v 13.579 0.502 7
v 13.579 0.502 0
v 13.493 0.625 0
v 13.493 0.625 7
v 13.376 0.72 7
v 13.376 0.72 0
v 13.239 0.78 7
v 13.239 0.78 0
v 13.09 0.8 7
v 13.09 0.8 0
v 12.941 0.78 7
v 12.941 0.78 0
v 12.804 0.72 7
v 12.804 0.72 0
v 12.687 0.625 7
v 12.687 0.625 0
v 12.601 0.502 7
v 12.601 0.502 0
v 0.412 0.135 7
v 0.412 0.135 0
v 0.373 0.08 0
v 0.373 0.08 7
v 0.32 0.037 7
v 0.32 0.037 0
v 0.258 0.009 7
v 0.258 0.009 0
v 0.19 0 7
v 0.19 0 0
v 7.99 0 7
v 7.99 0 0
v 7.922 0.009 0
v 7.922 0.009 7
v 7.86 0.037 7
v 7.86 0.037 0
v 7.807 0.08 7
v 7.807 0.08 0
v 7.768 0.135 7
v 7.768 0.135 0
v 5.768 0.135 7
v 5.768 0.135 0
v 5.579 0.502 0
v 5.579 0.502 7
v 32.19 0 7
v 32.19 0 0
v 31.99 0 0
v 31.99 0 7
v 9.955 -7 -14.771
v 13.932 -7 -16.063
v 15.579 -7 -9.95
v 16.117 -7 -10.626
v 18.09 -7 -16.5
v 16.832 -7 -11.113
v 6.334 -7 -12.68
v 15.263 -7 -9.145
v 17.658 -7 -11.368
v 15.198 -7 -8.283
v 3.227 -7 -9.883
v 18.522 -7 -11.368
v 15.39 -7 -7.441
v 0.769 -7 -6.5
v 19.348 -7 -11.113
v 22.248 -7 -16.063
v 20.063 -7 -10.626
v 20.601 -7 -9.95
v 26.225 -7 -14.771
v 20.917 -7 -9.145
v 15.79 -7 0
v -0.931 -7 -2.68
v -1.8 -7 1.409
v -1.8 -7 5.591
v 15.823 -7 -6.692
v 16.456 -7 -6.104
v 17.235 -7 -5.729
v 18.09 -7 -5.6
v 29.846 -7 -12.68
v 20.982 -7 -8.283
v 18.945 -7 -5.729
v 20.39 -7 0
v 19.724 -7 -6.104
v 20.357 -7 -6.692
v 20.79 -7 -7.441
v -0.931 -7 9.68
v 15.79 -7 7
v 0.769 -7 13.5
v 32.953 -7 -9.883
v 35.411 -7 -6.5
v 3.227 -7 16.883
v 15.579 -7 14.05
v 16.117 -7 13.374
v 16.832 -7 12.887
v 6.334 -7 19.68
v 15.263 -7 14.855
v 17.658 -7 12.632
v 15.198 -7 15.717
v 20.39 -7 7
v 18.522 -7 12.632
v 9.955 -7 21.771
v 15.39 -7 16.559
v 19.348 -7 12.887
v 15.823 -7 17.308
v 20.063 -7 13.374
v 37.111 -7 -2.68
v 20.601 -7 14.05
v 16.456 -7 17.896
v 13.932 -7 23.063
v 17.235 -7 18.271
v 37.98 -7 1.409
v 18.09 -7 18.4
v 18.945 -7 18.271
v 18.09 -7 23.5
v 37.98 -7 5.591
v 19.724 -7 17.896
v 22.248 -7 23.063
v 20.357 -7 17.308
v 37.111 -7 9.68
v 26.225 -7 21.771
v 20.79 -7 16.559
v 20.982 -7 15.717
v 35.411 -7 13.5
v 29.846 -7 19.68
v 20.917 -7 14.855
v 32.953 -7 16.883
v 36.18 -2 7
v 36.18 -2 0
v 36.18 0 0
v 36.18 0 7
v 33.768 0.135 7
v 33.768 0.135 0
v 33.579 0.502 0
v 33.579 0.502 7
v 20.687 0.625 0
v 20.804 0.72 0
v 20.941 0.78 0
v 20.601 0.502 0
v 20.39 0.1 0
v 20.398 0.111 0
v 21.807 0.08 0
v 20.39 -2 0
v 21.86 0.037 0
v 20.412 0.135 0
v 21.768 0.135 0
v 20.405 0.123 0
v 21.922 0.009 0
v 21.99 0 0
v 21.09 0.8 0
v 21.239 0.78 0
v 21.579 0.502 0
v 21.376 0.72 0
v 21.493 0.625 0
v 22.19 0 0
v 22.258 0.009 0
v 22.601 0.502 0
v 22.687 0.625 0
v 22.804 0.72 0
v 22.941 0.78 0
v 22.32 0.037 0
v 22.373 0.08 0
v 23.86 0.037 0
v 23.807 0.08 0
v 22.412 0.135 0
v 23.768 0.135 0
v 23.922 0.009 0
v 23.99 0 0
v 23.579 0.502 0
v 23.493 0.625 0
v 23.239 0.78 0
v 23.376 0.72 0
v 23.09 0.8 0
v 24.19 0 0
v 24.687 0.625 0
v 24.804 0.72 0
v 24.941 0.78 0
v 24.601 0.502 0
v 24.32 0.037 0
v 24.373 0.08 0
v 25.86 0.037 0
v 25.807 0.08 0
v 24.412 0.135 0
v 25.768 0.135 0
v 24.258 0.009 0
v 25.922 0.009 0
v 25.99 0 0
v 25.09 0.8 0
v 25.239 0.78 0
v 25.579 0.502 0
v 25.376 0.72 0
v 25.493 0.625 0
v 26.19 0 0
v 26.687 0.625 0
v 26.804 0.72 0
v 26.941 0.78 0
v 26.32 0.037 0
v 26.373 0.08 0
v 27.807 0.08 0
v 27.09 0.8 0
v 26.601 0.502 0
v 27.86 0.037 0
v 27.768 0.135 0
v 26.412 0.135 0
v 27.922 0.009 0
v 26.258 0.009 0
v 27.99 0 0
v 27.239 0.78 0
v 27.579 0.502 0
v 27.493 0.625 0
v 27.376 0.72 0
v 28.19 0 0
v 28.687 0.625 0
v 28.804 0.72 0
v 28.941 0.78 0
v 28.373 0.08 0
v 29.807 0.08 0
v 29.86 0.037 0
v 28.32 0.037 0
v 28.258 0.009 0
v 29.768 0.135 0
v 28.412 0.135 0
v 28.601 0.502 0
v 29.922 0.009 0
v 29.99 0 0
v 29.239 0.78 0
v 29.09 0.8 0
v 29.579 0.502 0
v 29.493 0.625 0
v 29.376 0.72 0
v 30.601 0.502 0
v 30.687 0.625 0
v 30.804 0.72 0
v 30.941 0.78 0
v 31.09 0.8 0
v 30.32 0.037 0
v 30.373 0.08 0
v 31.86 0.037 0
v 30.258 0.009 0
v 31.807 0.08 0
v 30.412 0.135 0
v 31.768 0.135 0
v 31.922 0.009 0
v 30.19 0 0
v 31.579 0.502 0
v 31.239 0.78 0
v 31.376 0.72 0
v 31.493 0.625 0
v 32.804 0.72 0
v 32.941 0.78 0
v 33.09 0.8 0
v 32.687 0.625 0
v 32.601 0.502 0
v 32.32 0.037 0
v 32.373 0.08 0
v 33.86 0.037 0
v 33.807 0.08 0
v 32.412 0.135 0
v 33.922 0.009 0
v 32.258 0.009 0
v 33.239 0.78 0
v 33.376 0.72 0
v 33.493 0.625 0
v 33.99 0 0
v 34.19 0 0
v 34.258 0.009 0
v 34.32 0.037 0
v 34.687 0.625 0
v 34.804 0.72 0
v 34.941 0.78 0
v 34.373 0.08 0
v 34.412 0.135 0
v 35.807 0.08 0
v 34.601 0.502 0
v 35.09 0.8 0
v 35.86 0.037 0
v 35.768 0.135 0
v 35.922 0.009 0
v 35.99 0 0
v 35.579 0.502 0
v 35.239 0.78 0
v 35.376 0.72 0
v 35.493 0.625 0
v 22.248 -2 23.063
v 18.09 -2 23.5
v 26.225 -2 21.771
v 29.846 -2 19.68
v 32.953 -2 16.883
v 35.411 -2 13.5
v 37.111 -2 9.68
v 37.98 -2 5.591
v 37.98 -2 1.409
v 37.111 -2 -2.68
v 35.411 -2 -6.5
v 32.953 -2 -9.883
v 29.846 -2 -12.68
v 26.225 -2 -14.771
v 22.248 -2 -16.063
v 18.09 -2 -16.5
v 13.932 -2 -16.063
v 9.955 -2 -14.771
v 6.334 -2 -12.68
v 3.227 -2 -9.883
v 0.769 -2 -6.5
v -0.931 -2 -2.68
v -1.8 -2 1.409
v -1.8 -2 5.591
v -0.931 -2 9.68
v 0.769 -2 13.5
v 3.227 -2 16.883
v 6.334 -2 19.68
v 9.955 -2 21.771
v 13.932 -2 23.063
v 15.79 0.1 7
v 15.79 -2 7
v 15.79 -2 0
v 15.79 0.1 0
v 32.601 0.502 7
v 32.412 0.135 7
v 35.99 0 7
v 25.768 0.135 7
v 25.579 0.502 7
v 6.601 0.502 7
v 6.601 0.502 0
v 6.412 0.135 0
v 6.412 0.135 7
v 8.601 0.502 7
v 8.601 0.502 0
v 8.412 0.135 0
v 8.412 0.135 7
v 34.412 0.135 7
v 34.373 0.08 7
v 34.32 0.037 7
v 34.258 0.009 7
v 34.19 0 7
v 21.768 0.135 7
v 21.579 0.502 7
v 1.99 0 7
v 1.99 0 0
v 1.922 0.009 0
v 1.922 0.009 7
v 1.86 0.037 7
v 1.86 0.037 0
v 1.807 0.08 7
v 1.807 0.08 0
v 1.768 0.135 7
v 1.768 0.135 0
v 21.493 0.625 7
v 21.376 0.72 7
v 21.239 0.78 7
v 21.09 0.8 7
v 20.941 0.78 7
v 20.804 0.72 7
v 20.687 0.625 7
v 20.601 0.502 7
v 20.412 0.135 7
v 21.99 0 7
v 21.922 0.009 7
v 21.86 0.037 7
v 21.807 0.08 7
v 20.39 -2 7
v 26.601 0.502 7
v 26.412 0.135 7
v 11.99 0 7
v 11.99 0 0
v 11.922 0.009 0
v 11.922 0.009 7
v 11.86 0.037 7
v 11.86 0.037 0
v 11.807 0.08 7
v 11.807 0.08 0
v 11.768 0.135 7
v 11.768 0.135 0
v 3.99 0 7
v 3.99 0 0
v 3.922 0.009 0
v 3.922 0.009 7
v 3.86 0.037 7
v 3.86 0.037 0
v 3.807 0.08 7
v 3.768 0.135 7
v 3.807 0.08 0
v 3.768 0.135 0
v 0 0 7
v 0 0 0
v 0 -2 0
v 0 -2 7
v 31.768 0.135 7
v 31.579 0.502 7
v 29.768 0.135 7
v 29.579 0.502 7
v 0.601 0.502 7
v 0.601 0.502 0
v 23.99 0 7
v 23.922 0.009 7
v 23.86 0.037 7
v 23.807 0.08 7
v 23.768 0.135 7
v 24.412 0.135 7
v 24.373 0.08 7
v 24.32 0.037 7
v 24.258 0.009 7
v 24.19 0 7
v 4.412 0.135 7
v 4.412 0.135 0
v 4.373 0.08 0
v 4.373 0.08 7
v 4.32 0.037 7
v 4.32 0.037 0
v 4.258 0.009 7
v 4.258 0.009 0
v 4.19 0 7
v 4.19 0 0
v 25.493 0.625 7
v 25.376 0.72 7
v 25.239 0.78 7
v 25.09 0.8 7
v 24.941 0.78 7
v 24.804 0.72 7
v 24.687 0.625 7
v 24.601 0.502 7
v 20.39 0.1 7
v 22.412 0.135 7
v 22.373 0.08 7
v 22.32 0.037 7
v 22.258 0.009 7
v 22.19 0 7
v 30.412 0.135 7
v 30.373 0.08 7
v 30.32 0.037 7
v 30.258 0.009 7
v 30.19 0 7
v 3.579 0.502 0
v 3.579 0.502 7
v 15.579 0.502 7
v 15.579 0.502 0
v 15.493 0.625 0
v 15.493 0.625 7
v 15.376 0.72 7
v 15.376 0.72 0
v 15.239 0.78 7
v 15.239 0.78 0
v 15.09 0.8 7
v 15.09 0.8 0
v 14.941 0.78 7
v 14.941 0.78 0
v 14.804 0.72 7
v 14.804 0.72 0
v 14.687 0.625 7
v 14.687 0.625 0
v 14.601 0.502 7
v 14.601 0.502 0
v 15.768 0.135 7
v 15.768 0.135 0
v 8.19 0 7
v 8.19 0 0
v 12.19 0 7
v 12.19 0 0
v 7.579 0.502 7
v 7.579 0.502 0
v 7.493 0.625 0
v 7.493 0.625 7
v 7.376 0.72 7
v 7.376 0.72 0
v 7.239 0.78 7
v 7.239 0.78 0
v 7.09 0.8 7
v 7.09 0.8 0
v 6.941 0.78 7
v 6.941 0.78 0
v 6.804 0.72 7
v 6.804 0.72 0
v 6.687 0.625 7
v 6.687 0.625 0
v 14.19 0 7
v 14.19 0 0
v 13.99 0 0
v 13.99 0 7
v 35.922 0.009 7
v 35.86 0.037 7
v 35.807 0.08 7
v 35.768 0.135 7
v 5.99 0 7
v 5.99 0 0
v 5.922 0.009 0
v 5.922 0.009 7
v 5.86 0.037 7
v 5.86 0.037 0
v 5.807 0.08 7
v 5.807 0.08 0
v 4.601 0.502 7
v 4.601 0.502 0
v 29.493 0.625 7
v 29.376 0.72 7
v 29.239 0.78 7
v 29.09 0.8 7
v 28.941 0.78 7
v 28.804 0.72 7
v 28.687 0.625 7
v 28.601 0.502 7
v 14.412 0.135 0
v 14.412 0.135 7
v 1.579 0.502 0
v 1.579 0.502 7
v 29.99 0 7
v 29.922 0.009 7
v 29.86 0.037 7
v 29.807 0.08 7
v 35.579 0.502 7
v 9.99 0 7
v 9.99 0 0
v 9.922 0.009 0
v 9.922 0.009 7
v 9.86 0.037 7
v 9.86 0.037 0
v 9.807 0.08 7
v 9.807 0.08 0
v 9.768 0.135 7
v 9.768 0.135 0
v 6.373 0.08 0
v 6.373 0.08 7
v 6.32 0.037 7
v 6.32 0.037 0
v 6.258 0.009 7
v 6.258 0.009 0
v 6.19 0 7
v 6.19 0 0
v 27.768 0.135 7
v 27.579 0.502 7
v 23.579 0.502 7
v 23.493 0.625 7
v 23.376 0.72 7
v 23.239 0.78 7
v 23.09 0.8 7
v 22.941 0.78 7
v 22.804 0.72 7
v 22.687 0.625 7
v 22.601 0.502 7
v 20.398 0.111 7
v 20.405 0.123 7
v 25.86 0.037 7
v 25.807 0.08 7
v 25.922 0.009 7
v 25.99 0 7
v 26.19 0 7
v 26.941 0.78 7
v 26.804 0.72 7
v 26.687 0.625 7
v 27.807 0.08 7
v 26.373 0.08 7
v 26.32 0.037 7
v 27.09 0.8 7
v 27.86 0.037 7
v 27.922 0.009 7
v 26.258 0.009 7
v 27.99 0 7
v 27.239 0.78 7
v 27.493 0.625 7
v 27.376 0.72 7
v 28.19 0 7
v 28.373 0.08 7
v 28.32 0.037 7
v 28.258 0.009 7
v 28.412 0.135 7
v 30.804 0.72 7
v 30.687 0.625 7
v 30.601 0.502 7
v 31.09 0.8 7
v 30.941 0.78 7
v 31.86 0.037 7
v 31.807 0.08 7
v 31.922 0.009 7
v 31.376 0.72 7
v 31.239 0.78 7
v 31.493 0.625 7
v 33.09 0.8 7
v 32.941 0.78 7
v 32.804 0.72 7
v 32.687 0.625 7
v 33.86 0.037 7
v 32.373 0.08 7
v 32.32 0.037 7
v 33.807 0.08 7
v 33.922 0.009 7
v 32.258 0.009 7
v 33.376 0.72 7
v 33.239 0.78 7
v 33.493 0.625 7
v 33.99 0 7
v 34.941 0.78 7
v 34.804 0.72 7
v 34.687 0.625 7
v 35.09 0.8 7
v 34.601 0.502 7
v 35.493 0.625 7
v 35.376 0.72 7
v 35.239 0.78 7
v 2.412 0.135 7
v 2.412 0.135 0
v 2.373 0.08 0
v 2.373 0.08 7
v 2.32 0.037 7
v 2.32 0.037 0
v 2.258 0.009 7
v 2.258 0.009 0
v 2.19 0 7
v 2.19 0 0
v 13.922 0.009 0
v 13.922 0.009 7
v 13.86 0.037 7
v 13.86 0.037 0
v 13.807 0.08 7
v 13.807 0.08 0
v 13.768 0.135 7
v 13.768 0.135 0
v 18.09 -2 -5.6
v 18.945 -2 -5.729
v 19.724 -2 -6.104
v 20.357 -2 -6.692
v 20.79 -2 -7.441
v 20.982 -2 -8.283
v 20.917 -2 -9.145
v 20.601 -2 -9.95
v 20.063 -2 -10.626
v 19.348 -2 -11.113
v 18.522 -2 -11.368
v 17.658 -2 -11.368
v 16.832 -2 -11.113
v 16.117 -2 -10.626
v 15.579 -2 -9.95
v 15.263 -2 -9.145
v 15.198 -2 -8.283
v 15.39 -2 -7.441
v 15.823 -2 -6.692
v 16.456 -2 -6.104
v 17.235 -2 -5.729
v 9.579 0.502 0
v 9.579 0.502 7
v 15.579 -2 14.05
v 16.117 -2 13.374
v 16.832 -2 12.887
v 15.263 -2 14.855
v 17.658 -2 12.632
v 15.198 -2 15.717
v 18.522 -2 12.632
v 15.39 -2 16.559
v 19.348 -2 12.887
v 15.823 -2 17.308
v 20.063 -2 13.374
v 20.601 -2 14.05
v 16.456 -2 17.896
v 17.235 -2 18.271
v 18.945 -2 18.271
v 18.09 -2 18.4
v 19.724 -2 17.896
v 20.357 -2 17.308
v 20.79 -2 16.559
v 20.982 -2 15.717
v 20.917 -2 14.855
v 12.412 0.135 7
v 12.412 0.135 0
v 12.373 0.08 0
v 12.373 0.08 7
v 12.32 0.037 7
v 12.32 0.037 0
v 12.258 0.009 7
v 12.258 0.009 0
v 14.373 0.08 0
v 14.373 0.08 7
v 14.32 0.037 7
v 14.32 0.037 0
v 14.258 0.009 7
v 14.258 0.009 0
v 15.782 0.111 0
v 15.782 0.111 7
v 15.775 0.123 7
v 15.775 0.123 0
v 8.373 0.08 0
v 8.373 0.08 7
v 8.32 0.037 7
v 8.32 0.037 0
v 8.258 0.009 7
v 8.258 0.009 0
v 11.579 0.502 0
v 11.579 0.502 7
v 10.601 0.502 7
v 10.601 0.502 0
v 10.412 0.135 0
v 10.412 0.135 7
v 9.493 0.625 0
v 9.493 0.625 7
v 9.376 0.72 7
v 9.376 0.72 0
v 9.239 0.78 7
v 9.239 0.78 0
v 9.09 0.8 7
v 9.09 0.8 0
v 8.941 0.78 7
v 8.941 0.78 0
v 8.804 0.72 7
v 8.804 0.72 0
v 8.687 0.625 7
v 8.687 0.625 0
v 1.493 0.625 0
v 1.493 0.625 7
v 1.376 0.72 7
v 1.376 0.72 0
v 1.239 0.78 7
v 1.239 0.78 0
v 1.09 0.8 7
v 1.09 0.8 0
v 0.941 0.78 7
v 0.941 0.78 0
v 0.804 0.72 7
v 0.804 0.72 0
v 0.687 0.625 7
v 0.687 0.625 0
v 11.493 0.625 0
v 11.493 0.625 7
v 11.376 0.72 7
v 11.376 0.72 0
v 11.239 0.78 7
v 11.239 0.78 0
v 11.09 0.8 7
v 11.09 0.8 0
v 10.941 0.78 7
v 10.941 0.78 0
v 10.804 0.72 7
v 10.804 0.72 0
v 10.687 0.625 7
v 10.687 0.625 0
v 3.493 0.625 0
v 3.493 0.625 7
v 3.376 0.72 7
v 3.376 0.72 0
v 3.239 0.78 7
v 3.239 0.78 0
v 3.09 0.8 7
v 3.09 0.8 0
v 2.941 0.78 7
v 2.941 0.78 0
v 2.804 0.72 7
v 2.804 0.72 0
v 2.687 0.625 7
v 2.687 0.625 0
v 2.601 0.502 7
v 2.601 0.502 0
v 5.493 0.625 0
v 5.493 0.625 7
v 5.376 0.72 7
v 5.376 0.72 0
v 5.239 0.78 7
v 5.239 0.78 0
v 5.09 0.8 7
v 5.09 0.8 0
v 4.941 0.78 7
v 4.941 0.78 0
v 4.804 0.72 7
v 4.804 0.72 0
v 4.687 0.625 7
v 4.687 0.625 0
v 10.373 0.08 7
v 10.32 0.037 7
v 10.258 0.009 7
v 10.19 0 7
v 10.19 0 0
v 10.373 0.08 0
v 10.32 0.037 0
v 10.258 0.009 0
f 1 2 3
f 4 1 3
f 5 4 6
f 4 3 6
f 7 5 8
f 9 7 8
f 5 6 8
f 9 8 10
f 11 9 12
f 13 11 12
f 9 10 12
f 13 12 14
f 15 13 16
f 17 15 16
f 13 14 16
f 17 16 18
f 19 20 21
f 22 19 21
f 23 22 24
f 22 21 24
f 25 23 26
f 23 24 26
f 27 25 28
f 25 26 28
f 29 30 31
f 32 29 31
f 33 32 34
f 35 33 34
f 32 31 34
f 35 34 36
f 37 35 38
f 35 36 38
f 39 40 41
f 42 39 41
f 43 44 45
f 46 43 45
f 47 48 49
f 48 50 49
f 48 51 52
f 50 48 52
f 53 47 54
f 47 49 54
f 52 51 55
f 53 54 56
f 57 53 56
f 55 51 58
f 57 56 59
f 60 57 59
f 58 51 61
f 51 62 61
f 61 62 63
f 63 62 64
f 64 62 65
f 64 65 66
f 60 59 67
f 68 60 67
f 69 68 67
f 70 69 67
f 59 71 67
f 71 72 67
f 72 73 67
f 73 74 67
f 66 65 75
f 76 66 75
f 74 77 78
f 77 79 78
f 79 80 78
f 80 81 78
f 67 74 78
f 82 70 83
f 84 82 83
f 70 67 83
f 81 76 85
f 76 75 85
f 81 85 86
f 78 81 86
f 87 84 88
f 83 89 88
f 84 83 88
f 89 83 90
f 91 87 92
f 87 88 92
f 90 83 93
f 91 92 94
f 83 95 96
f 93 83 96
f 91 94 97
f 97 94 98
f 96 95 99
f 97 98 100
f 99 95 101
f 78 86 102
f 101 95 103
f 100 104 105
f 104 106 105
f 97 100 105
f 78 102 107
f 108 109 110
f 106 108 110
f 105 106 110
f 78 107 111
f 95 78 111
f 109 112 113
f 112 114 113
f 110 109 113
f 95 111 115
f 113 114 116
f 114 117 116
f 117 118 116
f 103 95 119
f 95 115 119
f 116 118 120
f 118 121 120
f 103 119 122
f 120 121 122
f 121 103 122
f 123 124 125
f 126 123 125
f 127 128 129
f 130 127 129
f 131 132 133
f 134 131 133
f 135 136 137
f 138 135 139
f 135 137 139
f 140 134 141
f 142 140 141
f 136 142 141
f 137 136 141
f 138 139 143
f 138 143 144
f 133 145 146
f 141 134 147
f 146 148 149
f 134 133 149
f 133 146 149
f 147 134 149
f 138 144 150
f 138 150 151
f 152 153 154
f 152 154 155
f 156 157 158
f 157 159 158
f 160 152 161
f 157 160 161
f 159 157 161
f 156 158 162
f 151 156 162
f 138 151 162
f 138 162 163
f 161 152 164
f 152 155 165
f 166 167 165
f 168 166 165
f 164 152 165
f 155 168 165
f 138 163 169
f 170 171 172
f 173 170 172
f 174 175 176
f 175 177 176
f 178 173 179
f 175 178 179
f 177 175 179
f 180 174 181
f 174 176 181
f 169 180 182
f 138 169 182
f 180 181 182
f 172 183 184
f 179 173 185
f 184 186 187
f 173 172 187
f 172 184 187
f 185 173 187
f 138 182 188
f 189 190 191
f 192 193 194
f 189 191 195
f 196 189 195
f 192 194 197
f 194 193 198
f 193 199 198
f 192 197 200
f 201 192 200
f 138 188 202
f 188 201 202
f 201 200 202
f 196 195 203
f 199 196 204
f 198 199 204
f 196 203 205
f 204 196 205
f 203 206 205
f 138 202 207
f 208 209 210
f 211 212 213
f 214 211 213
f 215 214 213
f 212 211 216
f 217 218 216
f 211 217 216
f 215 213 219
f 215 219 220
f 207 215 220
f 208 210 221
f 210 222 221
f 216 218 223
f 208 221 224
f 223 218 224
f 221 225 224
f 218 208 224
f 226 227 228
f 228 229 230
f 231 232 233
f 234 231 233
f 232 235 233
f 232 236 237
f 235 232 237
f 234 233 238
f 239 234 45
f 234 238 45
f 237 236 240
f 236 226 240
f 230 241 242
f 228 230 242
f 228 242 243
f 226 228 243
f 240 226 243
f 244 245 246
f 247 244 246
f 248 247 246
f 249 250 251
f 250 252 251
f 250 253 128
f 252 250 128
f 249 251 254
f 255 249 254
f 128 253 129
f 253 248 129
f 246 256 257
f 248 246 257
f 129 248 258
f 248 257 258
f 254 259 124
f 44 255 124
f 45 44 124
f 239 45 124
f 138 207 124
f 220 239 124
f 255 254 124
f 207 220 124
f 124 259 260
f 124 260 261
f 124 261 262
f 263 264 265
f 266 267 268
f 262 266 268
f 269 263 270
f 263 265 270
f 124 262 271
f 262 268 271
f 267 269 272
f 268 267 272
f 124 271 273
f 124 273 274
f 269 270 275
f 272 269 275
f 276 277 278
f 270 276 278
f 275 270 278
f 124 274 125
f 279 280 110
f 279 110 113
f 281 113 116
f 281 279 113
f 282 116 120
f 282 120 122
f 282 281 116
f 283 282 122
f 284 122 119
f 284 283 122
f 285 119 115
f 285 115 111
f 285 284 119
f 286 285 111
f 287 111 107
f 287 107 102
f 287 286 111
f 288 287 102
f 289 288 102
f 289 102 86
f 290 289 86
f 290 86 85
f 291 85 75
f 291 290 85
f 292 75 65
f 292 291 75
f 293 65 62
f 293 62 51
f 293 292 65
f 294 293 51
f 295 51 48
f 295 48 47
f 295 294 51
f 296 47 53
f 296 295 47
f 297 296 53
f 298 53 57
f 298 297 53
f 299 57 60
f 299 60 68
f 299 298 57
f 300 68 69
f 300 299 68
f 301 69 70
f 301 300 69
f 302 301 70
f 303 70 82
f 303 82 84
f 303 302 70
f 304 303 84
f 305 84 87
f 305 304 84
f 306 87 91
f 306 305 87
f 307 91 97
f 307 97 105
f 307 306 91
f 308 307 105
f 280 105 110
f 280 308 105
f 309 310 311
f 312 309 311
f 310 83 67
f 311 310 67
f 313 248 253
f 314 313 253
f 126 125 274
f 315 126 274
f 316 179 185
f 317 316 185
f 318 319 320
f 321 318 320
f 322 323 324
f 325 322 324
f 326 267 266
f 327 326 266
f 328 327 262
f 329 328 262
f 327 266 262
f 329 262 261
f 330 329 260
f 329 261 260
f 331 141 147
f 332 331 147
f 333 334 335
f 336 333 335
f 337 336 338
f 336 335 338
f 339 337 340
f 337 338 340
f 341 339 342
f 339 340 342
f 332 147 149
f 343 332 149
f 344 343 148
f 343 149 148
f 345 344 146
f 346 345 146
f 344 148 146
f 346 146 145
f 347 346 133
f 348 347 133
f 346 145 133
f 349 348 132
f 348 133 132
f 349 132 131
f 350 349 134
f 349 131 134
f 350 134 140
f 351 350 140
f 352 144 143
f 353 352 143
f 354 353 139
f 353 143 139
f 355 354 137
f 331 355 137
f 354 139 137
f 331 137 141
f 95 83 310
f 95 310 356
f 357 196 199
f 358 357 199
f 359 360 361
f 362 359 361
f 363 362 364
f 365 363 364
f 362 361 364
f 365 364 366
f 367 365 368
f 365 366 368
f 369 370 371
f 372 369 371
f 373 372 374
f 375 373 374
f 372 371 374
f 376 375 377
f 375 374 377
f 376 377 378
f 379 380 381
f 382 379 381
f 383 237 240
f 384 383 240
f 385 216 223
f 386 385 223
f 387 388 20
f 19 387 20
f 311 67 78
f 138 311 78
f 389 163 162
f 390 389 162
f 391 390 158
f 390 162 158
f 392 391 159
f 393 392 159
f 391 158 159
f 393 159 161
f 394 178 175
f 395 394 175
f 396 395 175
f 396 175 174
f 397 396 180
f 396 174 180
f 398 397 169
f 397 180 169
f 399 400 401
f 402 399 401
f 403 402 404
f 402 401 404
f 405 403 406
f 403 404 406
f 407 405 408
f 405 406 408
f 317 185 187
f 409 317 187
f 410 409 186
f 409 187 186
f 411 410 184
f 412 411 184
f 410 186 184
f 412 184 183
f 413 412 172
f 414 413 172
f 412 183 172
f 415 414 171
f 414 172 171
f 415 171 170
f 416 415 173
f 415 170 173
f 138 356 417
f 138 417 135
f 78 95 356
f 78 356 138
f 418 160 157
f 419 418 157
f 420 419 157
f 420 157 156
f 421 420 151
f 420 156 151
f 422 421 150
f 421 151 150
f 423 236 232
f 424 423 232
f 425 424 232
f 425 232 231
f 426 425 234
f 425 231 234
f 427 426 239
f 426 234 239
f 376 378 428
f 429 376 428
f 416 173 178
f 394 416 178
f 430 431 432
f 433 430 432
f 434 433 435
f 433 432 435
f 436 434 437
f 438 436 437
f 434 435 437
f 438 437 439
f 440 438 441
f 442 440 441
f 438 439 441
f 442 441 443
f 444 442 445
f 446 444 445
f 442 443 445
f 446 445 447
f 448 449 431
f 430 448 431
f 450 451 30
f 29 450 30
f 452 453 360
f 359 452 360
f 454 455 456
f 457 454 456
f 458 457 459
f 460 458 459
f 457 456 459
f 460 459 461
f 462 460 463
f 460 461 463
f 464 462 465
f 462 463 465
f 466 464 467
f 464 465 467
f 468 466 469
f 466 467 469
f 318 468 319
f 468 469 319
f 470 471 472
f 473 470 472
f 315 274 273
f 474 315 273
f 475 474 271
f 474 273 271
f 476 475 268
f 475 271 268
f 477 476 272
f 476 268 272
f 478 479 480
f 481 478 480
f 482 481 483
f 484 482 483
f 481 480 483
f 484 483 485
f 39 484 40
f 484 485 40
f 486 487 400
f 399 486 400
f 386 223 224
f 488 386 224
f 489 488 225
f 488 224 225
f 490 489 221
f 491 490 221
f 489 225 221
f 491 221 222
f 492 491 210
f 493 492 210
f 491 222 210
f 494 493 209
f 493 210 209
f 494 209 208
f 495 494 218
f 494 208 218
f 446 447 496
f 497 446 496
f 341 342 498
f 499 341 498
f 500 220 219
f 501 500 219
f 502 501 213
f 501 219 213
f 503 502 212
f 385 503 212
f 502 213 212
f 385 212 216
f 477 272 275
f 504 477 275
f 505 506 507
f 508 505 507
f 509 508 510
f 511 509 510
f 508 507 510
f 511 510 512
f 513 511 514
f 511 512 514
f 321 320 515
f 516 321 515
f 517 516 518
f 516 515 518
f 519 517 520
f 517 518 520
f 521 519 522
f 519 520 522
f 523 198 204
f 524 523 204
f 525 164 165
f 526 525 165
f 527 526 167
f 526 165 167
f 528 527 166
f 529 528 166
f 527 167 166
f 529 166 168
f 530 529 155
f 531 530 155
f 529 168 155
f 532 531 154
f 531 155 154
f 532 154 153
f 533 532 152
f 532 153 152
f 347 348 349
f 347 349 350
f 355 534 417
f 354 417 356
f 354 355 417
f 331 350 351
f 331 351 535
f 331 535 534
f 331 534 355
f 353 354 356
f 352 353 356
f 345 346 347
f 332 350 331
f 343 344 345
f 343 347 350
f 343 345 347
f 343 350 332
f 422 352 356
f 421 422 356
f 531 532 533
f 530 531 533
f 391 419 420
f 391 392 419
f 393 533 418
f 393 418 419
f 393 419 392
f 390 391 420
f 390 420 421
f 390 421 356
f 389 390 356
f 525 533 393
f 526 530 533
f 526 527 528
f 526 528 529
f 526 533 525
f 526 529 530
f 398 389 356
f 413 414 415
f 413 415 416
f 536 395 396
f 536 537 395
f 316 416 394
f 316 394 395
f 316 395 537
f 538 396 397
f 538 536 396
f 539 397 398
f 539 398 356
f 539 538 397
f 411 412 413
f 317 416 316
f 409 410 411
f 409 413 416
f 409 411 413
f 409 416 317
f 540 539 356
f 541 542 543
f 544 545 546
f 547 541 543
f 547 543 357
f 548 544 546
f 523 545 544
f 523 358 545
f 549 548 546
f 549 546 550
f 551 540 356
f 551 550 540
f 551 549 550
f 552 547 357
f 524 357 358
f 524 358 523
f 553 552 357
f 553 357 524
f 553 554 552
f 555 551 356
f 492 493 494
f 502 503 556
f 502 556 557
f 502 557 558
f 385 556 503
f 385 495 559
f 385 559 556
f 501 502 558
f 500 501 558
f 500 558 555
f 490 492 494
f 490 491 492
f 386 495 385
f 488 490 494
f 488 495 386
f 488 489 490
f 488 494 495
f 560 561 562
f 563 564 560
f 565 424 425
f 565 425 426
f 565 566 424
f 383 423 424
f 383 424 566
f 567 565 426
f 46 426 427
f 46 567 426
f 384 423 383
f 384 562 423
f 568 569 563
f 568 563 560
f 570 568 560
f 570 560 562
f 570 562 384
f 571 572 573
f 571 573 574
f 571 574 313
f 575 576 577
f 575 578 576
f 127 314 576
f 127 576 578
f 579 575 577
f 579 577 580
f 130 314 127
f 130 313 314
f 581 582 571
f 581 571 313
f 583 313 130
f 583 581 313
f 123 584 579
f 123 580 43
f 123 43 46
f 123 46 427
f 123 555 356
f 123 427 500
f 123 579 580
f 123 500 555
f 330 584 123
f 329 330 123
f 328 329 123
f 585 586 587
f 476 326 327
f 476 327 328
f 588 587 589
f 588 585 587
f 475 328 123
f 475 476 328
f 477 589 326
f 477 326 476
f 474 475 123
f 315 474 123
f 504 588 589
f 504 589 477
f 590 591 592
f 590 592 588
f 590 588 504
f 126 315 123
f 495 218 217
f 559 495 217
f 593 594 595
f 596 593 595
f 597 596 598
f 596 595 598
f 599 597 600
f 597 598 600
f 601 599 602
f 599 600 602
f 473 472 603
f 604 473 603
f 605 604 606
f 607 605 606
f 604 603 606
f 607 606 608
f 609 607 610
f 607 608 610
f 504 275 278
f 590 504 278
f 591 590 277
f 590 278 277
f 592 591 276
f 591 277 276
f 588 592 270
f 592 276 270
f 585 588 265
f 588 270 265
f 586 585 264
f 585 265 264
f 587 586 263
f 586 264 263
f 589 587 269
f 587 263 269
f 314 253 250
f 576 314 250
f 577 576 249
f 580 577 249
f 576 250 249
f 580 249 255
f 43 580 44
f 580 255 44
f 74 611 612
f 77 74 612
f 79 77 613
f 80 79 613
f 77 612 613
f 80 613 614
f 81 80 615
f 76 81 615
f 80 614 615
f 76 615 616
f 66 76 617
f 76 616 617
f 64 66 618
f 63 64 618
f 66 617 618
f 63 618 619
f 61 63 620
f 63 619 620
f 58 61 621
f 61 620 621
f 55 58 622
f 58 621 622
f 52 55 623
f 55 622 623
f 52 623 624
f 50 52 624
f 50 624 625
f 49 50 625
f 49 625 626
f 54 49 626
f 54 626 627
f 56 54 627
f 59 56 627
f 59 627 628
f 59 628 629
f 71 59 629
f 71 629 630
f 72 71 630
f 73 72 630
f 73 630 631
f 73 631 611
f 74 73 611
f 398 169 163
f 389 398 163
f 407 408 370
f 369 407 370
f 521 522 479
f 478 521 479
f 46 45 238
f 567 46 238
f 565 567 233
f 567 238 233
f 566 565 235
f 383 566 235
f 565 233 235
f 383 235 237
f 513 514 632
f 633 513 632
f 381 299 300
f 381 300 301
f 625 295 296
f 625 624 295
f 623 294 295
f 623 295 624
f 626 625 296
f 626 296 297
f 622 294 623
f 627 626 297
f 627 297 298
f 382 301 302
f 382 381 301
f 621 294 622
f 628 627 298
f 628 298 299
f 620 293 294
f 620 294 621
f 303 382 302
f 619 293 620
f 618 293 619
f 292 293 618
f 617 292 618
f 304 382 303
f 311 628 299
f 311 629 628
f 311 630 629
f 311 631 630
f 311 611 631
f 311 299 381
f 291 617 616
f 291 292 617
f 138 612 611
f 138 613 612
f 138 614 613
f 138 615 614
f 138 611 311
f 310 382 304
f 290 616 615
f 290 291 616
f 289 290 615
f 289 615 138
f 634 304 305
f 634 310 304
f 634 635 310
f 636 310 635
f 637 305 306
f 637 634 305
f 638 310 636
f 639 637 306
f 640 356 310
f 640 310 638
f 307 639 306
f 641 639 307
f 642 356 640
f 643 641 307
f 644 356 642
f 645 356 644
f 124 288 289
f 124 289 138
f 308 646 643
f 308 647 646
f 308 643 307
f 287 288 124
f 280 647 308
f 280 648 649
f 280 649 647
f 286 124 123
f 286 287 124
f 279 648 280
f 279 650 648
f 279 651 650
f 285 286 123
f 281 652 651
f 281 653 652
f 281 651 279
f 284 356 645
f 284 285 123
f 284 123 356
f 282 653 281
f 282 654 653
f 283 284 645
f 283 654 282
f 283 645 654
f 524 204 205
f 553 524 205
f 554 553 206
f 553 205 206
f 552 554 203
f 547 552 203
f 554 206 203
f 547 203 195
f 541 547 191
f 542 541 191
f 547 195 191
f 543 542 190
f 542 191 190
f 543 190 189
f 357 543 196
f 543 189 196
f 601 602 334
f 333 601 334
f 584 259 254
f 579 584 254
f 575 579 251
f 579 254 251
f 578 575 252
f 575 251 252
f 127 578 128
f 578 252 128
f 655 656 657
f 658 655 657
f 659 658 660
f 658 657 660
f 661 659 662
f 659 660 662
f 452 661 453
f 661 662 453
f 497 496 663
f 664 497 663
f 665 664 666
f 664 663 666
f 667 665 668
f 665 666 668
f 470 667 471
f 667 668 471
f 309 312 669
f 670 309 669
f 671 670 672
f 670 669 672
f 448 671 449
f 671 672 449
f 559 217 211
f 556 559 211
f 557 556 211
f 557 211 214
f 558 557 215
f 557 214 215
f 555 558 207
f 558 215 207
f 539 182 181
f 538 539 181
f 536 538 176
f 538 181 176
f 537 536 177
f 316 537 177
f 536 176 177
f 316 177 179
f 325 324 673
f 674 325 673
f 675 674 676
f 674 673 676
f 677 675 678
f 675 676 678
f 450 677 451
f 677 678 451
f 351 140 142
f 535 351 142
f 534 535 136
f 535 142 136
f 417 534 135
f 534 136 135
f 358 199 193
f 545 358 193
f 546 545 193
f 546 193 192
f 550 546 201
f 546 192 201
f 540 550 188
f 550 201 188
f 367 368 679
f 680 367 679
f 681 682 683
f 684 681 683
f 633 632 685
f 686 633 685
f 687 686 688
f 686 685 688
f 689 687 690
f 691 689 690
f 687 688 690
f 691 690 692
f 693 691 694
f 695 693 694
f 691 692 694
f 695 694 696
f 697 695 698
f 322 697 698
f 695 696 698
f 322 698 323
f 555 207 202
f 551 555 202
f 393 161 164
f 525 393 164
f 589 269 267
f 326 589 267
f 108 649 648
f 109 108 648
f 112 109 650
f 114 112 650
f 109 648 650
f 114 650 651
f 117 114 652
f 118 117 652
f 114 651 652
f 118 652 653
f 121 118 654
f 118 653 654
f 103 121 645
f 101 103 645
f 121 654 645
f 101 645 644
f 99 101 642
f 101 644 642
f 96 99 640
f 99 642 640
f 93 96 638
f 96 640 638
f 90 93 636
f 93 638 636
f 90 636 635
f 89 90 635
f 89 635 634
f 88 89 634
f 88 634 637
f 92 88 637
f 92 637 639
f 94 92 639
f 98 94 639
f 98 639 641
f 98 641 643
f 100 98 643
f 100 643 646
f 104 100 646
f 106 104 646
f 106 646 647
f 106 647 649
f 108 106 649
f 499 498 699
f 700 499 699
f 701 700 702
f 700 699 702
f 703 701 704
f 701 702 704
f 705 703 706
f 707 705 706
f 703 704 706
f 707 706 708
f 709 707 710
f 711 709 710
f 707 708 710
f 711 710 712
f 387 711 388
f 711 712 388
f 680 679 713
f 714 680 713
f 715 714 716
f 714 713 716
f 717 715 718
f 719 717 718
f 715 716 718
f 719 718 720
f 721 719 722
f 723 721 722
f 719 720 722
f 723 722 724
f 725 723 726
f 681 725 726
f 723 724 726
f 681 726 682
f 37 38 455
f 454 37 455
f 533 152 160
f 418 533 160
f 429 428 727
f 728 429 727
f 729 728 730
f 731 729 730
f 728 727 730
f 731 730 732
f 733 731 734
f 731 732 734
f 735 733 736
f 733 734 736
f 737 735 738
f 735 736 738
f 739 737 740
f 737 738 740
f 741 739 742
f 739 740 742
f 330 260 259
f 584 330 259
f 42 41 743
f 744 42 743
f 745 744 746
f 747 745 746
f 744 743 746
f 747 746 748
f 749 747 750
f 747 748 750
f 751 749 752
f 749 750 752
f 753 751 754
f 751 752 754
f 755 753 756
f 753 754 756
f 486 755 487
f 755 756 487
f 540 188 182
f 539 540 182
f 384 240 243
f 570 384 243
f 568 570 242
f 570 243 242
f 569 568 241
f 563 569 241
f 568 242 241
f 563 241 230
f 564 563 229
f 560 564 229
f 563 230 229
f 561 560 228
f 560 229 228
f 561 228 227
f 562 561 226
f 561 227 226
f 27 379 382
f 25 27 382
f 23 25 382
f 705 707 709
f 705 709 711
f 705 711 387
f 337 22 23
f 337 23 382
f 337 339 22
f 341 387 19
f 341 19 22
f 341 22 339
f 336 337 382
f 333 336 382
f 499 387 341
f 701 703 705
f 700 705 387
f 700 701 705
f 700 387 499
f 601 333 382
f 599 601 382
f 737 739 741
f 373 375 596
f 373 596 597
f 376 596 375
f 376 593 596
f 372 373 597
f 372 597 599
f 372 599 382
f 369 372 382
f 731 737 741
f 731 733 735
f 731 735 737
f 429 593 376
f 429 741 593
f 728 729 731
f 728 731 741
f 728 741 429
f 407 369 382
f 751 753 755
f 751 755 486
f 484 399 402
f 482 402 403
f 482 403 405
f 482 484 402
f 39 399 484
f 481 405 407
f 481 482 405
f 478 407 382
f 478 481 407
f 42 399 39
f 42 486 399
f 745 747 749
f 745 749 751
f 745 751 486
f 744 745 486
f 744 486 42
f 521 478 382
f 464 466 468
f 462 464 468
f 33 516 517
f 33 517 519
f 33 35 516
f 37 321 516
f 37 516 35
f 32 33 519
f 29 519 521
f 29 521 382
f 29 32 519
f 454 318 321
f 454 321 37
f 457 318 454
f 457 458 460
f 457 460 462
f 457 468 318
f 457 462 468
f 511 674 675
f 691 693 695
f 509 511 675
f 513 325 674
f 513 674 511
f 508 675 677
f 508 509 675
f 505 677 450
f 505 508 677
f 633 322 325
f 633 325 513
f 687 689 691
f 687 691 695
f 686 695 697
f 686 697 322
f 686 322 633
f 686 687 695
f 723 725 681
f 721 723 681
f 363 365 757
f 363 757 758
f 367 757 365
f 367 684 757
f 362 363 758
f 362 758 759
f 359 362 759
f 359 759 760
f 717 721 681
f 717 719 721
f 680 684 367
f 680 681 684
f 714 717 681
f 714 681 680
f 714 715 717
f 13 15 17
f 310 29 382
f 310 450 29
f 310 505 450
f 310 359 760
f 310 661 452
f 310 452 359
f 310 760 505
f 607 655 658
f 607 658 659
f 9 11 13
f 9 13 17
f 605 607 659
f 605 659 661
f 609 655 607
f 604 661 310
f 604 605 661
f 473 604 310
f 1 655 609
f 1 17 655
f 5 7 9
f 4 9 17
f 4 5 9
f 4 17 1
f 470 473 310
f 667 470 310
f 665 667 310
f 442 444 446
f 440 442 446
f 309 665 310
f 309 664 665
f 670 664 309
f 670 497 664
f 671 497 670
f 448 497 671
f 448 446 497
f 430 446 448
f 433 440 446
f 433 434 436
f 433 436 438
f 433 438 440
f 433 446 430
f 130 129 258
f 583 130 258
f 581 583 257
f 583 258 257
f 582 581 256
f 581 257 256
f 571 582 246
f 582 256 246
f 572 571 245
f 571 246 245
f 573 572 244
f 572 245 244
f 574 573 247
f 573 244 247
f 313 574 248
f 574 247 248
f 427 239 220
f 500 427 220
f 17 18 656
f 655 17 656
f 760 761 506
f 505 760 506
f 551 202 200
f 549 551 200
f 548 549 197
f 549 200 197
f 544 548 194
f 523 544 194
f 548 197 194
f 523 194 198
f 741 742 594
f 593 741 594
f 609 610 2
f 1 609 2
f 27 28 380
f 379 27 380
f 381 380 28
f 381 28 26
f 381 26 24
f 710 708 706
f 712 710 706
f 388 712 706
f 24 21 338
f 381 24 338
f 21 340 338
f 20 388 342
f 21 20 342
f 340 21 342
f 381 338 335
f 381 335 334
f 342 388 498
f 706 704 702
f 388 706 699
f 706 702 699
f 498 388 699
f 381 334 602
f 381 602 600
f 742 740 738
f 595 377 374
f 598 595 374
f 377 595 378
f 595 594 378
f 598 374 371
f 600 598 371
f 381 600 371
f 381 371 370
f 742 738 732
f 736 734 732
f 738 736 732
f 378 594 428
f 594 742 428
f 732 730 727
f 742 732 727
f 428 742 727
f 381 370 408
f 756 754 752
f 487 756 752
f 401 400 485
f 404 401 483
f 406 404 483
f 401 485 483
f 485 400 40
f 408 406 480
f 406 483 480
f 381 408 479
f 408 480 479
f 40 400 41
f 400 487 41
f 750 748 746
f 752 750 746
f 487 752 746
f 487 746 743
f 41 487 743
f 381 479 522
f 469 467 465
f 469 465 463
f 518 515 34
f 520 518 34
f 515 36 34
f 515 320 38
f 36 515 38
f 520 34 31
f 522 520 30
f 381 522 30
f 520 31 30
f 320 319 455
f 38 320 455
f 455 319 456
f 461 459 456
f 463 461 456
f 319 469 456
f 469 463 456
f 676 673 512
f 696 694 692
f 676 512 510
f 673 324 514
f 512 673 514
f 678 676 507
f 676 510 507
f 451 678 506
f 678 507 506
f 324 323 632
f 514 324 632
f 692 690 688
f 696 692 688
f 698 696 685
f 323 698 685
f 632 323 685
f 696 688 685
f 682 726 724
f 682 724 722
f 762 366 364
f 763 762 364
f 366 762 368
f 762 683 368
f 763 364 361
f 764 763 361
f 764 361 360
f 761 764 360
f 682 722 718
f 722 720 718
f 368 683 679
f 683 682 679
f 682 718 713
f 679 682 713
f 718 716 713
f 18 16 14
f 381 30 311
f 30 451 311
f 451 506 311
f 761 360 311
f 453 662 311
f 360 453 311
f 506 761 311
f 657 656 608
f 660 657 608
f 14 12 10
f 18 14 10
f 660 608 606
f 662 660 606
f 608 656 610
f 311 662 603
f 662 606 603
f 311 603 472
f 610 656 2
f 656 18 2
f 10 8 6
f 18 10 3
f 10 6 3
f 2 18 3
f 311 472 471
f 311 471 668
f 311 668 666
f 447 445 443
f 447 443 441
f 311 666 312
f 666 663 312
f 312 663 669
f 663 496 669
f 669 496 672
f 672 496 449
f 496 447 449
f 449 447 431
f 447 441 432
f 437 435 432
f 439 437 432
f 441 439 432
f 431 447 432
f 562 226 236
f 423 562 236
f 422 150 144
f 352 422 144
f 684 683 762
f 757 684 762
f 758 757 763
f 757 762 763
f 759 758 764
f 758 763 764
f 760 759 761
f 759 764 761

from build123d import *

# Parameters (mm, degrees)
BOSS_EXTRUDE1_DEPTH     = 7
BOSS_EXTRUDE2_START     = -2
SKETCH2_R               = 20
BOSS_EXTRUDE2_DEPTH     = 5
CUT_EXTRUDE2_DEPTH      = 46.034410177
CUT_EXTRUDE2_DEPTH_BACK = 46.034410177
SKETCH4_W               = 4.6
SKETCH4_H               = 7
M5_CLEARANCE_HOLE1_D    = 5.8


with BuildPart() as part:
    # Sketch1 → Boss-Extrude1 (new body)
    with BuildSketch(Plane.XY):
        with BuildLine():
            Line((3.767777778, 0.135469288), (3.578888889, 0.501967566))
            ThreePointArc((3.578888889, 0.501967566), (3.09, 0.8), (2.601111111, 0.501967566))
            Line((2.601111111, 0.501967566), (2.412222222, 0.135469288))
            ThreePointArc((2.412222222, 0.135469288), (2.320129401, 0.036537266), (2.19, 0))
            Line((2.19, 0), (2.18, 0))
            Line((2.18, 0), (2, 0))
            Line((2, 0), (1.99, 0))
            ThreePointArc((1.99, 0), (1.859870599, 0.036537266), (1.767777778, 0.135469288))
            Line((1.767777778, 0.135469288), (1.578888889, 0.501967566))
            ThreePointArc((1.578888889, 0.501967566), (1.09, 0.8), (0.601111111, 0.501967566))
            Line((0.601111111, 0.501967566), (0.412222222, 0.135469288))
            ThreePointArc((0.412222222, 0.135469288), (0.320129401, 0.036537266), (0.19, 0))
            Line((0.19, 0), (0, 0))
            Line((0, 0), (0, -5))
            Line((0, -5), (36.18, -5))
            Line((36.18, -5), (36.18, 0))
            Line((36.18, 0), (35.99, 0))
            ThreePointArc((35.99, 0), (35.859870599, 0.036537266), (35.767777778, 0.135469288))
            Line((35.767777778, 0.135469288), (35.578888889, 0.501967566))
            ThreePointArc((35.578888889, 0.501967566), (35.09, 0.8), (34.601111111, 0.501967566))
            Line((34.601111111, 0.501967566), (34.412222222, 0.135469288))
            ThreePointArc((34.412222222, 0.135469288), (34.320129401, 0.036537266), (34.19, 0))
            Line((34.19, 0), (34.18, 0))
            Line((34.18, 0), (34, 0))
            Line((34, 0), (33.99, 0))
            ThreePointArc((33.99, 0), (33.859870599, 0.036537266), (33.767777778, 0.135469288))
            Line((33.767777778, 0.135469288), (33.578888889, 0.501967566))
            ThreePointArc((33.578888889, 0.501967566), (33.09, 0.8), (32.601111111, 0.501967566))
            Line((32.601111111, 0.501967566), (32.412222222, 0.135469288))
            ThreePointArc((32.412222222, 0.135469288), (32.320129401, 0.036537266), (32.19, 0))
            Line((32.19, 0), (32.18, 0))
            Line((32.18, 0), (32, 0))
            Line((32, 0), (31.99, 0))
            ThreePointArc((31.99, 0), (31.859870599, 0.036537266), (31.767777778, 0.135469288))
            Line((31.767777778, 0.135469288), (31.578888889, 0.501967566))
            ThreePointArc((31.578888889, 0.501967566), (31.09, 0.8), (30.601111111, 0.501967566))
            Line((30.601111111, 0.501967566), (30.412222222, 0.135469288))
            ThreePointArc((30.412222222, 0.135469288), (30.320129401, 0.036537266), (30.19, 0))
            Line((30.19, 0), (30.18, 0))
            Line((30.18, 0), (30, 0))
            Line((30, 0), (29.99, 0))
            ThreePointArc((29.99, 0), (29.859870599, 0.036537266), (29.767777778, 0.135469288))
            Line((29.767777778, 0.135469288), (29.578888889, 0.501967566))
            ThreePointArc((29.578888889, 0.501967566), (29.09, 0.8), (28.601111111, 0.501967566))
            Line((28.601111111, 0.501967566), (28.412222222, 0.135469288))
            ThreePointArc((28.412222222, 0.135469288), (28.320129401, 0.036537266), (28.19, 0))
            Line((28.19, 0), (28.18, 0))
            Line((28.18, 0), (28, 0))
            Line((28, 0), (27.99, 0))
            ThreePointArc((27.99, 0), (27.859870599, 0.036537266), (27.767777778, 0.135469288))
            Line((27.767777778, 0.135469288), (27.578888889, 0.501967566))
            ThreePointArc((27.578888889, 0.501967566), (27.09, 0.8), (26.601111111, 0.501967566))
            Line((26.601111111, 0.501967566), (26.412222222, 0.135469288))
            ThreePointArc((26.412222222, 0.135469288), (26.320129401, 0.036537266), (26.19, 0))
            Line((26.19, 0), (26.18, 0))
            Line((26.18, 0), (26, 0))
            Line((26, 0), (25.99, 0))
            ThreePointArc((25.99, 0), (25.859870599, 0.036537266), (25.767777778, 0.135469288))
            Line((25.767777778, 0.135469288), (25.578888889, 0.501967566))
            ThreePointArc((25.578888889, 0.501967566), (25.09, 0.8), (24.601111111, 0.501967566))
            Line((24.601111111, 0.501967566), (24.412222222, 0.135469288))
            ThreePointArc((24.412222222, 0.135469288), (24.320129401, 0.036537266), (24.19, 0))
            Line((24.19, 0), (24.18, 0))
            Line((24.18, 0), (24, 0))
            Line((24, 0), (23.99, 0))
            ThreePointArc((23.99, 0), (23.859870599, 0.036537266), (23.767777778, 0.135469288))
            Line((23.767777778, 0.135469288), (23.578888889, 0.501967566))
            ThreePointArc((23.578888889, 0.501967566), (23.09, 0.8), (22.601111111, 0.501967566))
            Line((22.601111111, 0.501967566), (22.412222222, 0.135469288))
            ThreePointArc((22.412222222, 0.135469288), (22.320129401, 0.036537266), (22.19, 0))
            Line((22.19, 0), (22.18, 0))
            Line((22.18, 0), (22, 0))
            Line((22, 0), (21.99, 0))
            ThreePointArc((21.99, 0), (21.859870599, 0.036537266), (21.767777778, 0.135469288))
            Line((21.767777778, 0.135469288), (21.578888889, 0.501967566))
            ThreePointArc((21.578888889, 0.501967566), (21.09, 0.8), (20.601111111, 0.501967566))
            Line((20.601111111, 0.501967566), (20.412222222, 0.135469288))
            ThreePointArc((20.412222222, 0.135469288), (20.320129401, 0.036537266), (20.19, 0))
            Line((20.19, 0), (20.18, 0))
            Line((20.18, 0), (20, 0))
            Line((20, 0), (19.99, 0))
            ThreePointArc((19.99, 0), (19.859870599, 0.036537266), (19.767777778, 0.135469288))
            Line((19.767777778, 0.135469288), (19.578888889, 0.501967566))
            ThreePointArc((19.578888889, 0.501967566), (19.09, 0.8), (18.601111111, 0.501967566))
            Line((18.601111111, 0.501967566), (18.412222222, 0.135469288))
            ThreePointArc((18.412222222, 0.135469288), (18.320129401, 0.036537266), (18.19, 0))
            Line((18.19, 0), (18.18, 0))
            Line((18.18, 0), (18, 0))
            Line((18, 0), (17.99, 0))
            ThreePointArc((17.99, 0), (17.859870599, 0.036537266), (17.767777778, 0.135469288))
            Line((17.767777778, 0.135469288), (17.578888889, 0.501967566))
            ThreePointArc((17.578888889, 0.501967566), (17.09, 0.8), (16.601111111, 0.501967566))
            Line((16.601111111, 0.501967566), (16.412222222, 0.135469288))
            ThreePointArc((16.412222222, 0.135469288), (16.320129401, 0.036537266), (16.19, 0))
            Line((16.19, 0), (16.18, 0))
            Line((16.18, 0), (16, 0))
            Line((16, 0), (15.99, 0))
            ThreePointArc((15.99, 0), (15.859870599, 0.036537266), (15.767777778, 0.135469288))
            Line((15.767777778, 0.135469288), (15.578888889, 0.501967566))
            ThreePointArc((15.578888889, 0.501967566), (15.09, 0.8), (14.601111111, 0.501967566))
            Line((14.601111111, 0.501967566), (14.412222222, 0.135469288))
            ThreePointArc((14.412222222, 0.135469288), (14.320129401, 0.036537266), (14.19, 0))
            Line((14.19, 0), (14.18, 0))
            Line((14.18, 0), (14, 0))
            Line((14, 0), (13.99, 0))
            ThreePointArc((13.99, 0), (13.859870599, 0.036537266), (13.767777778, 0.135469288))
            Line((13.767777778, 0.135469288), (13.578888889, 0.501967566))
            ThreePointArc((13.578888889, 0.501967566), (13.09, 0.8), (12.601111111, 0.501967566))
            Line((12.601111111, 0.501967566), (12.412222222, 0.135469288))
            ThreePointArc((12.412222222, 0.135469288), (12.320129401, 0.036537266), (12.19, 0))
            Line((12.19, 0), (12.18, 0))
            Line((12.18, 0), (12, 0))
            Line((12, 0), (11.99, 0))
            ThreePointArc((11.99, 0), (11.859870599, 0.036537266), (11.767777778, 0.135469288))
            Line((11.767777778, 0.135469288), (11.578888889, 0.501967566))
            ThreePointArc((11.578888889, 0.501967566), (11.09, 0.8), (10.601111111, 0.501967566))
            Line((10.601111111, 0.501967566), (10.412222222, 0.135469288))
            ThreePointArc((10.412222222, 0.135469288), (10.320129401, 0.036537266), (10.19, 0))
            Line((10.19, 0), (10.18, 0))
            Line((10.18, 0), (10, 0))
            Line((10, 0), (9.99, 0))
            ThreePointArc((9.99, 0), (9.859870599, 0.036537266), (9.767777778, 0.135469288))
            Line((9.767777778, 0.135469288), (9.578888889, 0.501967566))
            ThreePointArc((9.578888889, 0.501967566), (9.09, 0.8), (8.601111111, 0.501967566))
            Line((8.601111111, 0.501967566), (8.412222222, 0.135469288))
            ThreePointArc((8.412222222, 0.135469288), (8.320129401, 0.036537266), (8.19, 0))
            Line((8.19, 0), (8.18, 0))
            Line((8.18, 0), (8, 0))
            Line((8, 0), (7.99, 0))
            ThreePointArc((7.99, 0), (7.859870599, 0.036537266), (7.767777778, 0.135469288))
            Line((7.767777778, 0.135469288), (7.578888889, 0.501967566))
            ThreePointArc((7.578888889, 0.501967566), (7.09, 0.8), (6.601111111, 0.501967566))
            Line((6.601111111, 0.501967566), (6.412222222, 0.135469288))
            ThreePointArc((6.412222222, 0.135469288), (6.320129401, 0.036537266), (6.19, 0))
            Line((6.19, 0), (6.18, 0))
            Line((6.18, 0), (6, 0))
            Line((6, 0), (5.99, 0))
            ThreePointArc((5.99, 0), (5.859870599, 0.036537266), (5.767777778, 0.135469288))
            Line((5.767777778, 0.135469288), (5.578888889, 0.501967566))
            ThreePointArc((5.578888889, 0.501967566), (5.09, 0.8), (4.601111111, 0.501967566))
            Line((4.601111111, 0.501967566), (4.412222222, 0.135469288))
            ThreePointArc((4.412222222, 0.135469288), (4.320129401, 0.036537266), (4.19, 0))
            Line((4.19, 0), (4.18, 0))
            Line((4.18, 0), (4, 0))
            Line((4, 0), (3.99, 0))
            ThreePointArc((3.99, 0), (3.859870599, 0.036537266), (3.767777778, 0.135469288))
        make_face()
    extrude(amount=BOSS_EXTRUDE1_DEPTH)

    # Sketch2 → Boss-Extrude2 (add)
    with BuildSketch(Plane(origin=(0, 0, 0), x_dir=(1, 0, 0), z_dir=(0, 1, 0)).offset(BOSS_EXTRUDE2_START)):
        with Locations(Location((18.09, -3.5, 0), (0, 0, 270))):
            Circle(SKETCH2_R)
    extrude(amount=-BOSS_EXTRUDE2_DEPTH)

    # Sketch4 → Cut-Extrude2 (cut, two sides: drawn at the far end of the back side and taken through both)
    with BuildSketch(Plane(origin=(0, -2, 0), x_dir=(1, 0, 0), z_dir=(0, 1, 0)).offset(-CUT_EXTRUDE2_DEPTH_BACK)):
        with Locations((18.09, -3.5)):
            Rectangle(SKETCH4_W, SKETCH4_H)
    extrude(amount=CUT_EXTRUDE2_DEPTH + CUT_EXTRUDE2_DEPTH_BACK, mode=Mode.SUBTRACT)

    # M5 Clearance Hole1 (through all)
    with Locations(Plane(origin=(18.09, -7, 15.5), x_dir=(0, 0, -1), z_dir=(0, -1, 0))):
        with Locations((0, 0), (24, 0)):
            Hole(M5_CLEARANCE_HOLE1_D / 2)


solid = part.part
